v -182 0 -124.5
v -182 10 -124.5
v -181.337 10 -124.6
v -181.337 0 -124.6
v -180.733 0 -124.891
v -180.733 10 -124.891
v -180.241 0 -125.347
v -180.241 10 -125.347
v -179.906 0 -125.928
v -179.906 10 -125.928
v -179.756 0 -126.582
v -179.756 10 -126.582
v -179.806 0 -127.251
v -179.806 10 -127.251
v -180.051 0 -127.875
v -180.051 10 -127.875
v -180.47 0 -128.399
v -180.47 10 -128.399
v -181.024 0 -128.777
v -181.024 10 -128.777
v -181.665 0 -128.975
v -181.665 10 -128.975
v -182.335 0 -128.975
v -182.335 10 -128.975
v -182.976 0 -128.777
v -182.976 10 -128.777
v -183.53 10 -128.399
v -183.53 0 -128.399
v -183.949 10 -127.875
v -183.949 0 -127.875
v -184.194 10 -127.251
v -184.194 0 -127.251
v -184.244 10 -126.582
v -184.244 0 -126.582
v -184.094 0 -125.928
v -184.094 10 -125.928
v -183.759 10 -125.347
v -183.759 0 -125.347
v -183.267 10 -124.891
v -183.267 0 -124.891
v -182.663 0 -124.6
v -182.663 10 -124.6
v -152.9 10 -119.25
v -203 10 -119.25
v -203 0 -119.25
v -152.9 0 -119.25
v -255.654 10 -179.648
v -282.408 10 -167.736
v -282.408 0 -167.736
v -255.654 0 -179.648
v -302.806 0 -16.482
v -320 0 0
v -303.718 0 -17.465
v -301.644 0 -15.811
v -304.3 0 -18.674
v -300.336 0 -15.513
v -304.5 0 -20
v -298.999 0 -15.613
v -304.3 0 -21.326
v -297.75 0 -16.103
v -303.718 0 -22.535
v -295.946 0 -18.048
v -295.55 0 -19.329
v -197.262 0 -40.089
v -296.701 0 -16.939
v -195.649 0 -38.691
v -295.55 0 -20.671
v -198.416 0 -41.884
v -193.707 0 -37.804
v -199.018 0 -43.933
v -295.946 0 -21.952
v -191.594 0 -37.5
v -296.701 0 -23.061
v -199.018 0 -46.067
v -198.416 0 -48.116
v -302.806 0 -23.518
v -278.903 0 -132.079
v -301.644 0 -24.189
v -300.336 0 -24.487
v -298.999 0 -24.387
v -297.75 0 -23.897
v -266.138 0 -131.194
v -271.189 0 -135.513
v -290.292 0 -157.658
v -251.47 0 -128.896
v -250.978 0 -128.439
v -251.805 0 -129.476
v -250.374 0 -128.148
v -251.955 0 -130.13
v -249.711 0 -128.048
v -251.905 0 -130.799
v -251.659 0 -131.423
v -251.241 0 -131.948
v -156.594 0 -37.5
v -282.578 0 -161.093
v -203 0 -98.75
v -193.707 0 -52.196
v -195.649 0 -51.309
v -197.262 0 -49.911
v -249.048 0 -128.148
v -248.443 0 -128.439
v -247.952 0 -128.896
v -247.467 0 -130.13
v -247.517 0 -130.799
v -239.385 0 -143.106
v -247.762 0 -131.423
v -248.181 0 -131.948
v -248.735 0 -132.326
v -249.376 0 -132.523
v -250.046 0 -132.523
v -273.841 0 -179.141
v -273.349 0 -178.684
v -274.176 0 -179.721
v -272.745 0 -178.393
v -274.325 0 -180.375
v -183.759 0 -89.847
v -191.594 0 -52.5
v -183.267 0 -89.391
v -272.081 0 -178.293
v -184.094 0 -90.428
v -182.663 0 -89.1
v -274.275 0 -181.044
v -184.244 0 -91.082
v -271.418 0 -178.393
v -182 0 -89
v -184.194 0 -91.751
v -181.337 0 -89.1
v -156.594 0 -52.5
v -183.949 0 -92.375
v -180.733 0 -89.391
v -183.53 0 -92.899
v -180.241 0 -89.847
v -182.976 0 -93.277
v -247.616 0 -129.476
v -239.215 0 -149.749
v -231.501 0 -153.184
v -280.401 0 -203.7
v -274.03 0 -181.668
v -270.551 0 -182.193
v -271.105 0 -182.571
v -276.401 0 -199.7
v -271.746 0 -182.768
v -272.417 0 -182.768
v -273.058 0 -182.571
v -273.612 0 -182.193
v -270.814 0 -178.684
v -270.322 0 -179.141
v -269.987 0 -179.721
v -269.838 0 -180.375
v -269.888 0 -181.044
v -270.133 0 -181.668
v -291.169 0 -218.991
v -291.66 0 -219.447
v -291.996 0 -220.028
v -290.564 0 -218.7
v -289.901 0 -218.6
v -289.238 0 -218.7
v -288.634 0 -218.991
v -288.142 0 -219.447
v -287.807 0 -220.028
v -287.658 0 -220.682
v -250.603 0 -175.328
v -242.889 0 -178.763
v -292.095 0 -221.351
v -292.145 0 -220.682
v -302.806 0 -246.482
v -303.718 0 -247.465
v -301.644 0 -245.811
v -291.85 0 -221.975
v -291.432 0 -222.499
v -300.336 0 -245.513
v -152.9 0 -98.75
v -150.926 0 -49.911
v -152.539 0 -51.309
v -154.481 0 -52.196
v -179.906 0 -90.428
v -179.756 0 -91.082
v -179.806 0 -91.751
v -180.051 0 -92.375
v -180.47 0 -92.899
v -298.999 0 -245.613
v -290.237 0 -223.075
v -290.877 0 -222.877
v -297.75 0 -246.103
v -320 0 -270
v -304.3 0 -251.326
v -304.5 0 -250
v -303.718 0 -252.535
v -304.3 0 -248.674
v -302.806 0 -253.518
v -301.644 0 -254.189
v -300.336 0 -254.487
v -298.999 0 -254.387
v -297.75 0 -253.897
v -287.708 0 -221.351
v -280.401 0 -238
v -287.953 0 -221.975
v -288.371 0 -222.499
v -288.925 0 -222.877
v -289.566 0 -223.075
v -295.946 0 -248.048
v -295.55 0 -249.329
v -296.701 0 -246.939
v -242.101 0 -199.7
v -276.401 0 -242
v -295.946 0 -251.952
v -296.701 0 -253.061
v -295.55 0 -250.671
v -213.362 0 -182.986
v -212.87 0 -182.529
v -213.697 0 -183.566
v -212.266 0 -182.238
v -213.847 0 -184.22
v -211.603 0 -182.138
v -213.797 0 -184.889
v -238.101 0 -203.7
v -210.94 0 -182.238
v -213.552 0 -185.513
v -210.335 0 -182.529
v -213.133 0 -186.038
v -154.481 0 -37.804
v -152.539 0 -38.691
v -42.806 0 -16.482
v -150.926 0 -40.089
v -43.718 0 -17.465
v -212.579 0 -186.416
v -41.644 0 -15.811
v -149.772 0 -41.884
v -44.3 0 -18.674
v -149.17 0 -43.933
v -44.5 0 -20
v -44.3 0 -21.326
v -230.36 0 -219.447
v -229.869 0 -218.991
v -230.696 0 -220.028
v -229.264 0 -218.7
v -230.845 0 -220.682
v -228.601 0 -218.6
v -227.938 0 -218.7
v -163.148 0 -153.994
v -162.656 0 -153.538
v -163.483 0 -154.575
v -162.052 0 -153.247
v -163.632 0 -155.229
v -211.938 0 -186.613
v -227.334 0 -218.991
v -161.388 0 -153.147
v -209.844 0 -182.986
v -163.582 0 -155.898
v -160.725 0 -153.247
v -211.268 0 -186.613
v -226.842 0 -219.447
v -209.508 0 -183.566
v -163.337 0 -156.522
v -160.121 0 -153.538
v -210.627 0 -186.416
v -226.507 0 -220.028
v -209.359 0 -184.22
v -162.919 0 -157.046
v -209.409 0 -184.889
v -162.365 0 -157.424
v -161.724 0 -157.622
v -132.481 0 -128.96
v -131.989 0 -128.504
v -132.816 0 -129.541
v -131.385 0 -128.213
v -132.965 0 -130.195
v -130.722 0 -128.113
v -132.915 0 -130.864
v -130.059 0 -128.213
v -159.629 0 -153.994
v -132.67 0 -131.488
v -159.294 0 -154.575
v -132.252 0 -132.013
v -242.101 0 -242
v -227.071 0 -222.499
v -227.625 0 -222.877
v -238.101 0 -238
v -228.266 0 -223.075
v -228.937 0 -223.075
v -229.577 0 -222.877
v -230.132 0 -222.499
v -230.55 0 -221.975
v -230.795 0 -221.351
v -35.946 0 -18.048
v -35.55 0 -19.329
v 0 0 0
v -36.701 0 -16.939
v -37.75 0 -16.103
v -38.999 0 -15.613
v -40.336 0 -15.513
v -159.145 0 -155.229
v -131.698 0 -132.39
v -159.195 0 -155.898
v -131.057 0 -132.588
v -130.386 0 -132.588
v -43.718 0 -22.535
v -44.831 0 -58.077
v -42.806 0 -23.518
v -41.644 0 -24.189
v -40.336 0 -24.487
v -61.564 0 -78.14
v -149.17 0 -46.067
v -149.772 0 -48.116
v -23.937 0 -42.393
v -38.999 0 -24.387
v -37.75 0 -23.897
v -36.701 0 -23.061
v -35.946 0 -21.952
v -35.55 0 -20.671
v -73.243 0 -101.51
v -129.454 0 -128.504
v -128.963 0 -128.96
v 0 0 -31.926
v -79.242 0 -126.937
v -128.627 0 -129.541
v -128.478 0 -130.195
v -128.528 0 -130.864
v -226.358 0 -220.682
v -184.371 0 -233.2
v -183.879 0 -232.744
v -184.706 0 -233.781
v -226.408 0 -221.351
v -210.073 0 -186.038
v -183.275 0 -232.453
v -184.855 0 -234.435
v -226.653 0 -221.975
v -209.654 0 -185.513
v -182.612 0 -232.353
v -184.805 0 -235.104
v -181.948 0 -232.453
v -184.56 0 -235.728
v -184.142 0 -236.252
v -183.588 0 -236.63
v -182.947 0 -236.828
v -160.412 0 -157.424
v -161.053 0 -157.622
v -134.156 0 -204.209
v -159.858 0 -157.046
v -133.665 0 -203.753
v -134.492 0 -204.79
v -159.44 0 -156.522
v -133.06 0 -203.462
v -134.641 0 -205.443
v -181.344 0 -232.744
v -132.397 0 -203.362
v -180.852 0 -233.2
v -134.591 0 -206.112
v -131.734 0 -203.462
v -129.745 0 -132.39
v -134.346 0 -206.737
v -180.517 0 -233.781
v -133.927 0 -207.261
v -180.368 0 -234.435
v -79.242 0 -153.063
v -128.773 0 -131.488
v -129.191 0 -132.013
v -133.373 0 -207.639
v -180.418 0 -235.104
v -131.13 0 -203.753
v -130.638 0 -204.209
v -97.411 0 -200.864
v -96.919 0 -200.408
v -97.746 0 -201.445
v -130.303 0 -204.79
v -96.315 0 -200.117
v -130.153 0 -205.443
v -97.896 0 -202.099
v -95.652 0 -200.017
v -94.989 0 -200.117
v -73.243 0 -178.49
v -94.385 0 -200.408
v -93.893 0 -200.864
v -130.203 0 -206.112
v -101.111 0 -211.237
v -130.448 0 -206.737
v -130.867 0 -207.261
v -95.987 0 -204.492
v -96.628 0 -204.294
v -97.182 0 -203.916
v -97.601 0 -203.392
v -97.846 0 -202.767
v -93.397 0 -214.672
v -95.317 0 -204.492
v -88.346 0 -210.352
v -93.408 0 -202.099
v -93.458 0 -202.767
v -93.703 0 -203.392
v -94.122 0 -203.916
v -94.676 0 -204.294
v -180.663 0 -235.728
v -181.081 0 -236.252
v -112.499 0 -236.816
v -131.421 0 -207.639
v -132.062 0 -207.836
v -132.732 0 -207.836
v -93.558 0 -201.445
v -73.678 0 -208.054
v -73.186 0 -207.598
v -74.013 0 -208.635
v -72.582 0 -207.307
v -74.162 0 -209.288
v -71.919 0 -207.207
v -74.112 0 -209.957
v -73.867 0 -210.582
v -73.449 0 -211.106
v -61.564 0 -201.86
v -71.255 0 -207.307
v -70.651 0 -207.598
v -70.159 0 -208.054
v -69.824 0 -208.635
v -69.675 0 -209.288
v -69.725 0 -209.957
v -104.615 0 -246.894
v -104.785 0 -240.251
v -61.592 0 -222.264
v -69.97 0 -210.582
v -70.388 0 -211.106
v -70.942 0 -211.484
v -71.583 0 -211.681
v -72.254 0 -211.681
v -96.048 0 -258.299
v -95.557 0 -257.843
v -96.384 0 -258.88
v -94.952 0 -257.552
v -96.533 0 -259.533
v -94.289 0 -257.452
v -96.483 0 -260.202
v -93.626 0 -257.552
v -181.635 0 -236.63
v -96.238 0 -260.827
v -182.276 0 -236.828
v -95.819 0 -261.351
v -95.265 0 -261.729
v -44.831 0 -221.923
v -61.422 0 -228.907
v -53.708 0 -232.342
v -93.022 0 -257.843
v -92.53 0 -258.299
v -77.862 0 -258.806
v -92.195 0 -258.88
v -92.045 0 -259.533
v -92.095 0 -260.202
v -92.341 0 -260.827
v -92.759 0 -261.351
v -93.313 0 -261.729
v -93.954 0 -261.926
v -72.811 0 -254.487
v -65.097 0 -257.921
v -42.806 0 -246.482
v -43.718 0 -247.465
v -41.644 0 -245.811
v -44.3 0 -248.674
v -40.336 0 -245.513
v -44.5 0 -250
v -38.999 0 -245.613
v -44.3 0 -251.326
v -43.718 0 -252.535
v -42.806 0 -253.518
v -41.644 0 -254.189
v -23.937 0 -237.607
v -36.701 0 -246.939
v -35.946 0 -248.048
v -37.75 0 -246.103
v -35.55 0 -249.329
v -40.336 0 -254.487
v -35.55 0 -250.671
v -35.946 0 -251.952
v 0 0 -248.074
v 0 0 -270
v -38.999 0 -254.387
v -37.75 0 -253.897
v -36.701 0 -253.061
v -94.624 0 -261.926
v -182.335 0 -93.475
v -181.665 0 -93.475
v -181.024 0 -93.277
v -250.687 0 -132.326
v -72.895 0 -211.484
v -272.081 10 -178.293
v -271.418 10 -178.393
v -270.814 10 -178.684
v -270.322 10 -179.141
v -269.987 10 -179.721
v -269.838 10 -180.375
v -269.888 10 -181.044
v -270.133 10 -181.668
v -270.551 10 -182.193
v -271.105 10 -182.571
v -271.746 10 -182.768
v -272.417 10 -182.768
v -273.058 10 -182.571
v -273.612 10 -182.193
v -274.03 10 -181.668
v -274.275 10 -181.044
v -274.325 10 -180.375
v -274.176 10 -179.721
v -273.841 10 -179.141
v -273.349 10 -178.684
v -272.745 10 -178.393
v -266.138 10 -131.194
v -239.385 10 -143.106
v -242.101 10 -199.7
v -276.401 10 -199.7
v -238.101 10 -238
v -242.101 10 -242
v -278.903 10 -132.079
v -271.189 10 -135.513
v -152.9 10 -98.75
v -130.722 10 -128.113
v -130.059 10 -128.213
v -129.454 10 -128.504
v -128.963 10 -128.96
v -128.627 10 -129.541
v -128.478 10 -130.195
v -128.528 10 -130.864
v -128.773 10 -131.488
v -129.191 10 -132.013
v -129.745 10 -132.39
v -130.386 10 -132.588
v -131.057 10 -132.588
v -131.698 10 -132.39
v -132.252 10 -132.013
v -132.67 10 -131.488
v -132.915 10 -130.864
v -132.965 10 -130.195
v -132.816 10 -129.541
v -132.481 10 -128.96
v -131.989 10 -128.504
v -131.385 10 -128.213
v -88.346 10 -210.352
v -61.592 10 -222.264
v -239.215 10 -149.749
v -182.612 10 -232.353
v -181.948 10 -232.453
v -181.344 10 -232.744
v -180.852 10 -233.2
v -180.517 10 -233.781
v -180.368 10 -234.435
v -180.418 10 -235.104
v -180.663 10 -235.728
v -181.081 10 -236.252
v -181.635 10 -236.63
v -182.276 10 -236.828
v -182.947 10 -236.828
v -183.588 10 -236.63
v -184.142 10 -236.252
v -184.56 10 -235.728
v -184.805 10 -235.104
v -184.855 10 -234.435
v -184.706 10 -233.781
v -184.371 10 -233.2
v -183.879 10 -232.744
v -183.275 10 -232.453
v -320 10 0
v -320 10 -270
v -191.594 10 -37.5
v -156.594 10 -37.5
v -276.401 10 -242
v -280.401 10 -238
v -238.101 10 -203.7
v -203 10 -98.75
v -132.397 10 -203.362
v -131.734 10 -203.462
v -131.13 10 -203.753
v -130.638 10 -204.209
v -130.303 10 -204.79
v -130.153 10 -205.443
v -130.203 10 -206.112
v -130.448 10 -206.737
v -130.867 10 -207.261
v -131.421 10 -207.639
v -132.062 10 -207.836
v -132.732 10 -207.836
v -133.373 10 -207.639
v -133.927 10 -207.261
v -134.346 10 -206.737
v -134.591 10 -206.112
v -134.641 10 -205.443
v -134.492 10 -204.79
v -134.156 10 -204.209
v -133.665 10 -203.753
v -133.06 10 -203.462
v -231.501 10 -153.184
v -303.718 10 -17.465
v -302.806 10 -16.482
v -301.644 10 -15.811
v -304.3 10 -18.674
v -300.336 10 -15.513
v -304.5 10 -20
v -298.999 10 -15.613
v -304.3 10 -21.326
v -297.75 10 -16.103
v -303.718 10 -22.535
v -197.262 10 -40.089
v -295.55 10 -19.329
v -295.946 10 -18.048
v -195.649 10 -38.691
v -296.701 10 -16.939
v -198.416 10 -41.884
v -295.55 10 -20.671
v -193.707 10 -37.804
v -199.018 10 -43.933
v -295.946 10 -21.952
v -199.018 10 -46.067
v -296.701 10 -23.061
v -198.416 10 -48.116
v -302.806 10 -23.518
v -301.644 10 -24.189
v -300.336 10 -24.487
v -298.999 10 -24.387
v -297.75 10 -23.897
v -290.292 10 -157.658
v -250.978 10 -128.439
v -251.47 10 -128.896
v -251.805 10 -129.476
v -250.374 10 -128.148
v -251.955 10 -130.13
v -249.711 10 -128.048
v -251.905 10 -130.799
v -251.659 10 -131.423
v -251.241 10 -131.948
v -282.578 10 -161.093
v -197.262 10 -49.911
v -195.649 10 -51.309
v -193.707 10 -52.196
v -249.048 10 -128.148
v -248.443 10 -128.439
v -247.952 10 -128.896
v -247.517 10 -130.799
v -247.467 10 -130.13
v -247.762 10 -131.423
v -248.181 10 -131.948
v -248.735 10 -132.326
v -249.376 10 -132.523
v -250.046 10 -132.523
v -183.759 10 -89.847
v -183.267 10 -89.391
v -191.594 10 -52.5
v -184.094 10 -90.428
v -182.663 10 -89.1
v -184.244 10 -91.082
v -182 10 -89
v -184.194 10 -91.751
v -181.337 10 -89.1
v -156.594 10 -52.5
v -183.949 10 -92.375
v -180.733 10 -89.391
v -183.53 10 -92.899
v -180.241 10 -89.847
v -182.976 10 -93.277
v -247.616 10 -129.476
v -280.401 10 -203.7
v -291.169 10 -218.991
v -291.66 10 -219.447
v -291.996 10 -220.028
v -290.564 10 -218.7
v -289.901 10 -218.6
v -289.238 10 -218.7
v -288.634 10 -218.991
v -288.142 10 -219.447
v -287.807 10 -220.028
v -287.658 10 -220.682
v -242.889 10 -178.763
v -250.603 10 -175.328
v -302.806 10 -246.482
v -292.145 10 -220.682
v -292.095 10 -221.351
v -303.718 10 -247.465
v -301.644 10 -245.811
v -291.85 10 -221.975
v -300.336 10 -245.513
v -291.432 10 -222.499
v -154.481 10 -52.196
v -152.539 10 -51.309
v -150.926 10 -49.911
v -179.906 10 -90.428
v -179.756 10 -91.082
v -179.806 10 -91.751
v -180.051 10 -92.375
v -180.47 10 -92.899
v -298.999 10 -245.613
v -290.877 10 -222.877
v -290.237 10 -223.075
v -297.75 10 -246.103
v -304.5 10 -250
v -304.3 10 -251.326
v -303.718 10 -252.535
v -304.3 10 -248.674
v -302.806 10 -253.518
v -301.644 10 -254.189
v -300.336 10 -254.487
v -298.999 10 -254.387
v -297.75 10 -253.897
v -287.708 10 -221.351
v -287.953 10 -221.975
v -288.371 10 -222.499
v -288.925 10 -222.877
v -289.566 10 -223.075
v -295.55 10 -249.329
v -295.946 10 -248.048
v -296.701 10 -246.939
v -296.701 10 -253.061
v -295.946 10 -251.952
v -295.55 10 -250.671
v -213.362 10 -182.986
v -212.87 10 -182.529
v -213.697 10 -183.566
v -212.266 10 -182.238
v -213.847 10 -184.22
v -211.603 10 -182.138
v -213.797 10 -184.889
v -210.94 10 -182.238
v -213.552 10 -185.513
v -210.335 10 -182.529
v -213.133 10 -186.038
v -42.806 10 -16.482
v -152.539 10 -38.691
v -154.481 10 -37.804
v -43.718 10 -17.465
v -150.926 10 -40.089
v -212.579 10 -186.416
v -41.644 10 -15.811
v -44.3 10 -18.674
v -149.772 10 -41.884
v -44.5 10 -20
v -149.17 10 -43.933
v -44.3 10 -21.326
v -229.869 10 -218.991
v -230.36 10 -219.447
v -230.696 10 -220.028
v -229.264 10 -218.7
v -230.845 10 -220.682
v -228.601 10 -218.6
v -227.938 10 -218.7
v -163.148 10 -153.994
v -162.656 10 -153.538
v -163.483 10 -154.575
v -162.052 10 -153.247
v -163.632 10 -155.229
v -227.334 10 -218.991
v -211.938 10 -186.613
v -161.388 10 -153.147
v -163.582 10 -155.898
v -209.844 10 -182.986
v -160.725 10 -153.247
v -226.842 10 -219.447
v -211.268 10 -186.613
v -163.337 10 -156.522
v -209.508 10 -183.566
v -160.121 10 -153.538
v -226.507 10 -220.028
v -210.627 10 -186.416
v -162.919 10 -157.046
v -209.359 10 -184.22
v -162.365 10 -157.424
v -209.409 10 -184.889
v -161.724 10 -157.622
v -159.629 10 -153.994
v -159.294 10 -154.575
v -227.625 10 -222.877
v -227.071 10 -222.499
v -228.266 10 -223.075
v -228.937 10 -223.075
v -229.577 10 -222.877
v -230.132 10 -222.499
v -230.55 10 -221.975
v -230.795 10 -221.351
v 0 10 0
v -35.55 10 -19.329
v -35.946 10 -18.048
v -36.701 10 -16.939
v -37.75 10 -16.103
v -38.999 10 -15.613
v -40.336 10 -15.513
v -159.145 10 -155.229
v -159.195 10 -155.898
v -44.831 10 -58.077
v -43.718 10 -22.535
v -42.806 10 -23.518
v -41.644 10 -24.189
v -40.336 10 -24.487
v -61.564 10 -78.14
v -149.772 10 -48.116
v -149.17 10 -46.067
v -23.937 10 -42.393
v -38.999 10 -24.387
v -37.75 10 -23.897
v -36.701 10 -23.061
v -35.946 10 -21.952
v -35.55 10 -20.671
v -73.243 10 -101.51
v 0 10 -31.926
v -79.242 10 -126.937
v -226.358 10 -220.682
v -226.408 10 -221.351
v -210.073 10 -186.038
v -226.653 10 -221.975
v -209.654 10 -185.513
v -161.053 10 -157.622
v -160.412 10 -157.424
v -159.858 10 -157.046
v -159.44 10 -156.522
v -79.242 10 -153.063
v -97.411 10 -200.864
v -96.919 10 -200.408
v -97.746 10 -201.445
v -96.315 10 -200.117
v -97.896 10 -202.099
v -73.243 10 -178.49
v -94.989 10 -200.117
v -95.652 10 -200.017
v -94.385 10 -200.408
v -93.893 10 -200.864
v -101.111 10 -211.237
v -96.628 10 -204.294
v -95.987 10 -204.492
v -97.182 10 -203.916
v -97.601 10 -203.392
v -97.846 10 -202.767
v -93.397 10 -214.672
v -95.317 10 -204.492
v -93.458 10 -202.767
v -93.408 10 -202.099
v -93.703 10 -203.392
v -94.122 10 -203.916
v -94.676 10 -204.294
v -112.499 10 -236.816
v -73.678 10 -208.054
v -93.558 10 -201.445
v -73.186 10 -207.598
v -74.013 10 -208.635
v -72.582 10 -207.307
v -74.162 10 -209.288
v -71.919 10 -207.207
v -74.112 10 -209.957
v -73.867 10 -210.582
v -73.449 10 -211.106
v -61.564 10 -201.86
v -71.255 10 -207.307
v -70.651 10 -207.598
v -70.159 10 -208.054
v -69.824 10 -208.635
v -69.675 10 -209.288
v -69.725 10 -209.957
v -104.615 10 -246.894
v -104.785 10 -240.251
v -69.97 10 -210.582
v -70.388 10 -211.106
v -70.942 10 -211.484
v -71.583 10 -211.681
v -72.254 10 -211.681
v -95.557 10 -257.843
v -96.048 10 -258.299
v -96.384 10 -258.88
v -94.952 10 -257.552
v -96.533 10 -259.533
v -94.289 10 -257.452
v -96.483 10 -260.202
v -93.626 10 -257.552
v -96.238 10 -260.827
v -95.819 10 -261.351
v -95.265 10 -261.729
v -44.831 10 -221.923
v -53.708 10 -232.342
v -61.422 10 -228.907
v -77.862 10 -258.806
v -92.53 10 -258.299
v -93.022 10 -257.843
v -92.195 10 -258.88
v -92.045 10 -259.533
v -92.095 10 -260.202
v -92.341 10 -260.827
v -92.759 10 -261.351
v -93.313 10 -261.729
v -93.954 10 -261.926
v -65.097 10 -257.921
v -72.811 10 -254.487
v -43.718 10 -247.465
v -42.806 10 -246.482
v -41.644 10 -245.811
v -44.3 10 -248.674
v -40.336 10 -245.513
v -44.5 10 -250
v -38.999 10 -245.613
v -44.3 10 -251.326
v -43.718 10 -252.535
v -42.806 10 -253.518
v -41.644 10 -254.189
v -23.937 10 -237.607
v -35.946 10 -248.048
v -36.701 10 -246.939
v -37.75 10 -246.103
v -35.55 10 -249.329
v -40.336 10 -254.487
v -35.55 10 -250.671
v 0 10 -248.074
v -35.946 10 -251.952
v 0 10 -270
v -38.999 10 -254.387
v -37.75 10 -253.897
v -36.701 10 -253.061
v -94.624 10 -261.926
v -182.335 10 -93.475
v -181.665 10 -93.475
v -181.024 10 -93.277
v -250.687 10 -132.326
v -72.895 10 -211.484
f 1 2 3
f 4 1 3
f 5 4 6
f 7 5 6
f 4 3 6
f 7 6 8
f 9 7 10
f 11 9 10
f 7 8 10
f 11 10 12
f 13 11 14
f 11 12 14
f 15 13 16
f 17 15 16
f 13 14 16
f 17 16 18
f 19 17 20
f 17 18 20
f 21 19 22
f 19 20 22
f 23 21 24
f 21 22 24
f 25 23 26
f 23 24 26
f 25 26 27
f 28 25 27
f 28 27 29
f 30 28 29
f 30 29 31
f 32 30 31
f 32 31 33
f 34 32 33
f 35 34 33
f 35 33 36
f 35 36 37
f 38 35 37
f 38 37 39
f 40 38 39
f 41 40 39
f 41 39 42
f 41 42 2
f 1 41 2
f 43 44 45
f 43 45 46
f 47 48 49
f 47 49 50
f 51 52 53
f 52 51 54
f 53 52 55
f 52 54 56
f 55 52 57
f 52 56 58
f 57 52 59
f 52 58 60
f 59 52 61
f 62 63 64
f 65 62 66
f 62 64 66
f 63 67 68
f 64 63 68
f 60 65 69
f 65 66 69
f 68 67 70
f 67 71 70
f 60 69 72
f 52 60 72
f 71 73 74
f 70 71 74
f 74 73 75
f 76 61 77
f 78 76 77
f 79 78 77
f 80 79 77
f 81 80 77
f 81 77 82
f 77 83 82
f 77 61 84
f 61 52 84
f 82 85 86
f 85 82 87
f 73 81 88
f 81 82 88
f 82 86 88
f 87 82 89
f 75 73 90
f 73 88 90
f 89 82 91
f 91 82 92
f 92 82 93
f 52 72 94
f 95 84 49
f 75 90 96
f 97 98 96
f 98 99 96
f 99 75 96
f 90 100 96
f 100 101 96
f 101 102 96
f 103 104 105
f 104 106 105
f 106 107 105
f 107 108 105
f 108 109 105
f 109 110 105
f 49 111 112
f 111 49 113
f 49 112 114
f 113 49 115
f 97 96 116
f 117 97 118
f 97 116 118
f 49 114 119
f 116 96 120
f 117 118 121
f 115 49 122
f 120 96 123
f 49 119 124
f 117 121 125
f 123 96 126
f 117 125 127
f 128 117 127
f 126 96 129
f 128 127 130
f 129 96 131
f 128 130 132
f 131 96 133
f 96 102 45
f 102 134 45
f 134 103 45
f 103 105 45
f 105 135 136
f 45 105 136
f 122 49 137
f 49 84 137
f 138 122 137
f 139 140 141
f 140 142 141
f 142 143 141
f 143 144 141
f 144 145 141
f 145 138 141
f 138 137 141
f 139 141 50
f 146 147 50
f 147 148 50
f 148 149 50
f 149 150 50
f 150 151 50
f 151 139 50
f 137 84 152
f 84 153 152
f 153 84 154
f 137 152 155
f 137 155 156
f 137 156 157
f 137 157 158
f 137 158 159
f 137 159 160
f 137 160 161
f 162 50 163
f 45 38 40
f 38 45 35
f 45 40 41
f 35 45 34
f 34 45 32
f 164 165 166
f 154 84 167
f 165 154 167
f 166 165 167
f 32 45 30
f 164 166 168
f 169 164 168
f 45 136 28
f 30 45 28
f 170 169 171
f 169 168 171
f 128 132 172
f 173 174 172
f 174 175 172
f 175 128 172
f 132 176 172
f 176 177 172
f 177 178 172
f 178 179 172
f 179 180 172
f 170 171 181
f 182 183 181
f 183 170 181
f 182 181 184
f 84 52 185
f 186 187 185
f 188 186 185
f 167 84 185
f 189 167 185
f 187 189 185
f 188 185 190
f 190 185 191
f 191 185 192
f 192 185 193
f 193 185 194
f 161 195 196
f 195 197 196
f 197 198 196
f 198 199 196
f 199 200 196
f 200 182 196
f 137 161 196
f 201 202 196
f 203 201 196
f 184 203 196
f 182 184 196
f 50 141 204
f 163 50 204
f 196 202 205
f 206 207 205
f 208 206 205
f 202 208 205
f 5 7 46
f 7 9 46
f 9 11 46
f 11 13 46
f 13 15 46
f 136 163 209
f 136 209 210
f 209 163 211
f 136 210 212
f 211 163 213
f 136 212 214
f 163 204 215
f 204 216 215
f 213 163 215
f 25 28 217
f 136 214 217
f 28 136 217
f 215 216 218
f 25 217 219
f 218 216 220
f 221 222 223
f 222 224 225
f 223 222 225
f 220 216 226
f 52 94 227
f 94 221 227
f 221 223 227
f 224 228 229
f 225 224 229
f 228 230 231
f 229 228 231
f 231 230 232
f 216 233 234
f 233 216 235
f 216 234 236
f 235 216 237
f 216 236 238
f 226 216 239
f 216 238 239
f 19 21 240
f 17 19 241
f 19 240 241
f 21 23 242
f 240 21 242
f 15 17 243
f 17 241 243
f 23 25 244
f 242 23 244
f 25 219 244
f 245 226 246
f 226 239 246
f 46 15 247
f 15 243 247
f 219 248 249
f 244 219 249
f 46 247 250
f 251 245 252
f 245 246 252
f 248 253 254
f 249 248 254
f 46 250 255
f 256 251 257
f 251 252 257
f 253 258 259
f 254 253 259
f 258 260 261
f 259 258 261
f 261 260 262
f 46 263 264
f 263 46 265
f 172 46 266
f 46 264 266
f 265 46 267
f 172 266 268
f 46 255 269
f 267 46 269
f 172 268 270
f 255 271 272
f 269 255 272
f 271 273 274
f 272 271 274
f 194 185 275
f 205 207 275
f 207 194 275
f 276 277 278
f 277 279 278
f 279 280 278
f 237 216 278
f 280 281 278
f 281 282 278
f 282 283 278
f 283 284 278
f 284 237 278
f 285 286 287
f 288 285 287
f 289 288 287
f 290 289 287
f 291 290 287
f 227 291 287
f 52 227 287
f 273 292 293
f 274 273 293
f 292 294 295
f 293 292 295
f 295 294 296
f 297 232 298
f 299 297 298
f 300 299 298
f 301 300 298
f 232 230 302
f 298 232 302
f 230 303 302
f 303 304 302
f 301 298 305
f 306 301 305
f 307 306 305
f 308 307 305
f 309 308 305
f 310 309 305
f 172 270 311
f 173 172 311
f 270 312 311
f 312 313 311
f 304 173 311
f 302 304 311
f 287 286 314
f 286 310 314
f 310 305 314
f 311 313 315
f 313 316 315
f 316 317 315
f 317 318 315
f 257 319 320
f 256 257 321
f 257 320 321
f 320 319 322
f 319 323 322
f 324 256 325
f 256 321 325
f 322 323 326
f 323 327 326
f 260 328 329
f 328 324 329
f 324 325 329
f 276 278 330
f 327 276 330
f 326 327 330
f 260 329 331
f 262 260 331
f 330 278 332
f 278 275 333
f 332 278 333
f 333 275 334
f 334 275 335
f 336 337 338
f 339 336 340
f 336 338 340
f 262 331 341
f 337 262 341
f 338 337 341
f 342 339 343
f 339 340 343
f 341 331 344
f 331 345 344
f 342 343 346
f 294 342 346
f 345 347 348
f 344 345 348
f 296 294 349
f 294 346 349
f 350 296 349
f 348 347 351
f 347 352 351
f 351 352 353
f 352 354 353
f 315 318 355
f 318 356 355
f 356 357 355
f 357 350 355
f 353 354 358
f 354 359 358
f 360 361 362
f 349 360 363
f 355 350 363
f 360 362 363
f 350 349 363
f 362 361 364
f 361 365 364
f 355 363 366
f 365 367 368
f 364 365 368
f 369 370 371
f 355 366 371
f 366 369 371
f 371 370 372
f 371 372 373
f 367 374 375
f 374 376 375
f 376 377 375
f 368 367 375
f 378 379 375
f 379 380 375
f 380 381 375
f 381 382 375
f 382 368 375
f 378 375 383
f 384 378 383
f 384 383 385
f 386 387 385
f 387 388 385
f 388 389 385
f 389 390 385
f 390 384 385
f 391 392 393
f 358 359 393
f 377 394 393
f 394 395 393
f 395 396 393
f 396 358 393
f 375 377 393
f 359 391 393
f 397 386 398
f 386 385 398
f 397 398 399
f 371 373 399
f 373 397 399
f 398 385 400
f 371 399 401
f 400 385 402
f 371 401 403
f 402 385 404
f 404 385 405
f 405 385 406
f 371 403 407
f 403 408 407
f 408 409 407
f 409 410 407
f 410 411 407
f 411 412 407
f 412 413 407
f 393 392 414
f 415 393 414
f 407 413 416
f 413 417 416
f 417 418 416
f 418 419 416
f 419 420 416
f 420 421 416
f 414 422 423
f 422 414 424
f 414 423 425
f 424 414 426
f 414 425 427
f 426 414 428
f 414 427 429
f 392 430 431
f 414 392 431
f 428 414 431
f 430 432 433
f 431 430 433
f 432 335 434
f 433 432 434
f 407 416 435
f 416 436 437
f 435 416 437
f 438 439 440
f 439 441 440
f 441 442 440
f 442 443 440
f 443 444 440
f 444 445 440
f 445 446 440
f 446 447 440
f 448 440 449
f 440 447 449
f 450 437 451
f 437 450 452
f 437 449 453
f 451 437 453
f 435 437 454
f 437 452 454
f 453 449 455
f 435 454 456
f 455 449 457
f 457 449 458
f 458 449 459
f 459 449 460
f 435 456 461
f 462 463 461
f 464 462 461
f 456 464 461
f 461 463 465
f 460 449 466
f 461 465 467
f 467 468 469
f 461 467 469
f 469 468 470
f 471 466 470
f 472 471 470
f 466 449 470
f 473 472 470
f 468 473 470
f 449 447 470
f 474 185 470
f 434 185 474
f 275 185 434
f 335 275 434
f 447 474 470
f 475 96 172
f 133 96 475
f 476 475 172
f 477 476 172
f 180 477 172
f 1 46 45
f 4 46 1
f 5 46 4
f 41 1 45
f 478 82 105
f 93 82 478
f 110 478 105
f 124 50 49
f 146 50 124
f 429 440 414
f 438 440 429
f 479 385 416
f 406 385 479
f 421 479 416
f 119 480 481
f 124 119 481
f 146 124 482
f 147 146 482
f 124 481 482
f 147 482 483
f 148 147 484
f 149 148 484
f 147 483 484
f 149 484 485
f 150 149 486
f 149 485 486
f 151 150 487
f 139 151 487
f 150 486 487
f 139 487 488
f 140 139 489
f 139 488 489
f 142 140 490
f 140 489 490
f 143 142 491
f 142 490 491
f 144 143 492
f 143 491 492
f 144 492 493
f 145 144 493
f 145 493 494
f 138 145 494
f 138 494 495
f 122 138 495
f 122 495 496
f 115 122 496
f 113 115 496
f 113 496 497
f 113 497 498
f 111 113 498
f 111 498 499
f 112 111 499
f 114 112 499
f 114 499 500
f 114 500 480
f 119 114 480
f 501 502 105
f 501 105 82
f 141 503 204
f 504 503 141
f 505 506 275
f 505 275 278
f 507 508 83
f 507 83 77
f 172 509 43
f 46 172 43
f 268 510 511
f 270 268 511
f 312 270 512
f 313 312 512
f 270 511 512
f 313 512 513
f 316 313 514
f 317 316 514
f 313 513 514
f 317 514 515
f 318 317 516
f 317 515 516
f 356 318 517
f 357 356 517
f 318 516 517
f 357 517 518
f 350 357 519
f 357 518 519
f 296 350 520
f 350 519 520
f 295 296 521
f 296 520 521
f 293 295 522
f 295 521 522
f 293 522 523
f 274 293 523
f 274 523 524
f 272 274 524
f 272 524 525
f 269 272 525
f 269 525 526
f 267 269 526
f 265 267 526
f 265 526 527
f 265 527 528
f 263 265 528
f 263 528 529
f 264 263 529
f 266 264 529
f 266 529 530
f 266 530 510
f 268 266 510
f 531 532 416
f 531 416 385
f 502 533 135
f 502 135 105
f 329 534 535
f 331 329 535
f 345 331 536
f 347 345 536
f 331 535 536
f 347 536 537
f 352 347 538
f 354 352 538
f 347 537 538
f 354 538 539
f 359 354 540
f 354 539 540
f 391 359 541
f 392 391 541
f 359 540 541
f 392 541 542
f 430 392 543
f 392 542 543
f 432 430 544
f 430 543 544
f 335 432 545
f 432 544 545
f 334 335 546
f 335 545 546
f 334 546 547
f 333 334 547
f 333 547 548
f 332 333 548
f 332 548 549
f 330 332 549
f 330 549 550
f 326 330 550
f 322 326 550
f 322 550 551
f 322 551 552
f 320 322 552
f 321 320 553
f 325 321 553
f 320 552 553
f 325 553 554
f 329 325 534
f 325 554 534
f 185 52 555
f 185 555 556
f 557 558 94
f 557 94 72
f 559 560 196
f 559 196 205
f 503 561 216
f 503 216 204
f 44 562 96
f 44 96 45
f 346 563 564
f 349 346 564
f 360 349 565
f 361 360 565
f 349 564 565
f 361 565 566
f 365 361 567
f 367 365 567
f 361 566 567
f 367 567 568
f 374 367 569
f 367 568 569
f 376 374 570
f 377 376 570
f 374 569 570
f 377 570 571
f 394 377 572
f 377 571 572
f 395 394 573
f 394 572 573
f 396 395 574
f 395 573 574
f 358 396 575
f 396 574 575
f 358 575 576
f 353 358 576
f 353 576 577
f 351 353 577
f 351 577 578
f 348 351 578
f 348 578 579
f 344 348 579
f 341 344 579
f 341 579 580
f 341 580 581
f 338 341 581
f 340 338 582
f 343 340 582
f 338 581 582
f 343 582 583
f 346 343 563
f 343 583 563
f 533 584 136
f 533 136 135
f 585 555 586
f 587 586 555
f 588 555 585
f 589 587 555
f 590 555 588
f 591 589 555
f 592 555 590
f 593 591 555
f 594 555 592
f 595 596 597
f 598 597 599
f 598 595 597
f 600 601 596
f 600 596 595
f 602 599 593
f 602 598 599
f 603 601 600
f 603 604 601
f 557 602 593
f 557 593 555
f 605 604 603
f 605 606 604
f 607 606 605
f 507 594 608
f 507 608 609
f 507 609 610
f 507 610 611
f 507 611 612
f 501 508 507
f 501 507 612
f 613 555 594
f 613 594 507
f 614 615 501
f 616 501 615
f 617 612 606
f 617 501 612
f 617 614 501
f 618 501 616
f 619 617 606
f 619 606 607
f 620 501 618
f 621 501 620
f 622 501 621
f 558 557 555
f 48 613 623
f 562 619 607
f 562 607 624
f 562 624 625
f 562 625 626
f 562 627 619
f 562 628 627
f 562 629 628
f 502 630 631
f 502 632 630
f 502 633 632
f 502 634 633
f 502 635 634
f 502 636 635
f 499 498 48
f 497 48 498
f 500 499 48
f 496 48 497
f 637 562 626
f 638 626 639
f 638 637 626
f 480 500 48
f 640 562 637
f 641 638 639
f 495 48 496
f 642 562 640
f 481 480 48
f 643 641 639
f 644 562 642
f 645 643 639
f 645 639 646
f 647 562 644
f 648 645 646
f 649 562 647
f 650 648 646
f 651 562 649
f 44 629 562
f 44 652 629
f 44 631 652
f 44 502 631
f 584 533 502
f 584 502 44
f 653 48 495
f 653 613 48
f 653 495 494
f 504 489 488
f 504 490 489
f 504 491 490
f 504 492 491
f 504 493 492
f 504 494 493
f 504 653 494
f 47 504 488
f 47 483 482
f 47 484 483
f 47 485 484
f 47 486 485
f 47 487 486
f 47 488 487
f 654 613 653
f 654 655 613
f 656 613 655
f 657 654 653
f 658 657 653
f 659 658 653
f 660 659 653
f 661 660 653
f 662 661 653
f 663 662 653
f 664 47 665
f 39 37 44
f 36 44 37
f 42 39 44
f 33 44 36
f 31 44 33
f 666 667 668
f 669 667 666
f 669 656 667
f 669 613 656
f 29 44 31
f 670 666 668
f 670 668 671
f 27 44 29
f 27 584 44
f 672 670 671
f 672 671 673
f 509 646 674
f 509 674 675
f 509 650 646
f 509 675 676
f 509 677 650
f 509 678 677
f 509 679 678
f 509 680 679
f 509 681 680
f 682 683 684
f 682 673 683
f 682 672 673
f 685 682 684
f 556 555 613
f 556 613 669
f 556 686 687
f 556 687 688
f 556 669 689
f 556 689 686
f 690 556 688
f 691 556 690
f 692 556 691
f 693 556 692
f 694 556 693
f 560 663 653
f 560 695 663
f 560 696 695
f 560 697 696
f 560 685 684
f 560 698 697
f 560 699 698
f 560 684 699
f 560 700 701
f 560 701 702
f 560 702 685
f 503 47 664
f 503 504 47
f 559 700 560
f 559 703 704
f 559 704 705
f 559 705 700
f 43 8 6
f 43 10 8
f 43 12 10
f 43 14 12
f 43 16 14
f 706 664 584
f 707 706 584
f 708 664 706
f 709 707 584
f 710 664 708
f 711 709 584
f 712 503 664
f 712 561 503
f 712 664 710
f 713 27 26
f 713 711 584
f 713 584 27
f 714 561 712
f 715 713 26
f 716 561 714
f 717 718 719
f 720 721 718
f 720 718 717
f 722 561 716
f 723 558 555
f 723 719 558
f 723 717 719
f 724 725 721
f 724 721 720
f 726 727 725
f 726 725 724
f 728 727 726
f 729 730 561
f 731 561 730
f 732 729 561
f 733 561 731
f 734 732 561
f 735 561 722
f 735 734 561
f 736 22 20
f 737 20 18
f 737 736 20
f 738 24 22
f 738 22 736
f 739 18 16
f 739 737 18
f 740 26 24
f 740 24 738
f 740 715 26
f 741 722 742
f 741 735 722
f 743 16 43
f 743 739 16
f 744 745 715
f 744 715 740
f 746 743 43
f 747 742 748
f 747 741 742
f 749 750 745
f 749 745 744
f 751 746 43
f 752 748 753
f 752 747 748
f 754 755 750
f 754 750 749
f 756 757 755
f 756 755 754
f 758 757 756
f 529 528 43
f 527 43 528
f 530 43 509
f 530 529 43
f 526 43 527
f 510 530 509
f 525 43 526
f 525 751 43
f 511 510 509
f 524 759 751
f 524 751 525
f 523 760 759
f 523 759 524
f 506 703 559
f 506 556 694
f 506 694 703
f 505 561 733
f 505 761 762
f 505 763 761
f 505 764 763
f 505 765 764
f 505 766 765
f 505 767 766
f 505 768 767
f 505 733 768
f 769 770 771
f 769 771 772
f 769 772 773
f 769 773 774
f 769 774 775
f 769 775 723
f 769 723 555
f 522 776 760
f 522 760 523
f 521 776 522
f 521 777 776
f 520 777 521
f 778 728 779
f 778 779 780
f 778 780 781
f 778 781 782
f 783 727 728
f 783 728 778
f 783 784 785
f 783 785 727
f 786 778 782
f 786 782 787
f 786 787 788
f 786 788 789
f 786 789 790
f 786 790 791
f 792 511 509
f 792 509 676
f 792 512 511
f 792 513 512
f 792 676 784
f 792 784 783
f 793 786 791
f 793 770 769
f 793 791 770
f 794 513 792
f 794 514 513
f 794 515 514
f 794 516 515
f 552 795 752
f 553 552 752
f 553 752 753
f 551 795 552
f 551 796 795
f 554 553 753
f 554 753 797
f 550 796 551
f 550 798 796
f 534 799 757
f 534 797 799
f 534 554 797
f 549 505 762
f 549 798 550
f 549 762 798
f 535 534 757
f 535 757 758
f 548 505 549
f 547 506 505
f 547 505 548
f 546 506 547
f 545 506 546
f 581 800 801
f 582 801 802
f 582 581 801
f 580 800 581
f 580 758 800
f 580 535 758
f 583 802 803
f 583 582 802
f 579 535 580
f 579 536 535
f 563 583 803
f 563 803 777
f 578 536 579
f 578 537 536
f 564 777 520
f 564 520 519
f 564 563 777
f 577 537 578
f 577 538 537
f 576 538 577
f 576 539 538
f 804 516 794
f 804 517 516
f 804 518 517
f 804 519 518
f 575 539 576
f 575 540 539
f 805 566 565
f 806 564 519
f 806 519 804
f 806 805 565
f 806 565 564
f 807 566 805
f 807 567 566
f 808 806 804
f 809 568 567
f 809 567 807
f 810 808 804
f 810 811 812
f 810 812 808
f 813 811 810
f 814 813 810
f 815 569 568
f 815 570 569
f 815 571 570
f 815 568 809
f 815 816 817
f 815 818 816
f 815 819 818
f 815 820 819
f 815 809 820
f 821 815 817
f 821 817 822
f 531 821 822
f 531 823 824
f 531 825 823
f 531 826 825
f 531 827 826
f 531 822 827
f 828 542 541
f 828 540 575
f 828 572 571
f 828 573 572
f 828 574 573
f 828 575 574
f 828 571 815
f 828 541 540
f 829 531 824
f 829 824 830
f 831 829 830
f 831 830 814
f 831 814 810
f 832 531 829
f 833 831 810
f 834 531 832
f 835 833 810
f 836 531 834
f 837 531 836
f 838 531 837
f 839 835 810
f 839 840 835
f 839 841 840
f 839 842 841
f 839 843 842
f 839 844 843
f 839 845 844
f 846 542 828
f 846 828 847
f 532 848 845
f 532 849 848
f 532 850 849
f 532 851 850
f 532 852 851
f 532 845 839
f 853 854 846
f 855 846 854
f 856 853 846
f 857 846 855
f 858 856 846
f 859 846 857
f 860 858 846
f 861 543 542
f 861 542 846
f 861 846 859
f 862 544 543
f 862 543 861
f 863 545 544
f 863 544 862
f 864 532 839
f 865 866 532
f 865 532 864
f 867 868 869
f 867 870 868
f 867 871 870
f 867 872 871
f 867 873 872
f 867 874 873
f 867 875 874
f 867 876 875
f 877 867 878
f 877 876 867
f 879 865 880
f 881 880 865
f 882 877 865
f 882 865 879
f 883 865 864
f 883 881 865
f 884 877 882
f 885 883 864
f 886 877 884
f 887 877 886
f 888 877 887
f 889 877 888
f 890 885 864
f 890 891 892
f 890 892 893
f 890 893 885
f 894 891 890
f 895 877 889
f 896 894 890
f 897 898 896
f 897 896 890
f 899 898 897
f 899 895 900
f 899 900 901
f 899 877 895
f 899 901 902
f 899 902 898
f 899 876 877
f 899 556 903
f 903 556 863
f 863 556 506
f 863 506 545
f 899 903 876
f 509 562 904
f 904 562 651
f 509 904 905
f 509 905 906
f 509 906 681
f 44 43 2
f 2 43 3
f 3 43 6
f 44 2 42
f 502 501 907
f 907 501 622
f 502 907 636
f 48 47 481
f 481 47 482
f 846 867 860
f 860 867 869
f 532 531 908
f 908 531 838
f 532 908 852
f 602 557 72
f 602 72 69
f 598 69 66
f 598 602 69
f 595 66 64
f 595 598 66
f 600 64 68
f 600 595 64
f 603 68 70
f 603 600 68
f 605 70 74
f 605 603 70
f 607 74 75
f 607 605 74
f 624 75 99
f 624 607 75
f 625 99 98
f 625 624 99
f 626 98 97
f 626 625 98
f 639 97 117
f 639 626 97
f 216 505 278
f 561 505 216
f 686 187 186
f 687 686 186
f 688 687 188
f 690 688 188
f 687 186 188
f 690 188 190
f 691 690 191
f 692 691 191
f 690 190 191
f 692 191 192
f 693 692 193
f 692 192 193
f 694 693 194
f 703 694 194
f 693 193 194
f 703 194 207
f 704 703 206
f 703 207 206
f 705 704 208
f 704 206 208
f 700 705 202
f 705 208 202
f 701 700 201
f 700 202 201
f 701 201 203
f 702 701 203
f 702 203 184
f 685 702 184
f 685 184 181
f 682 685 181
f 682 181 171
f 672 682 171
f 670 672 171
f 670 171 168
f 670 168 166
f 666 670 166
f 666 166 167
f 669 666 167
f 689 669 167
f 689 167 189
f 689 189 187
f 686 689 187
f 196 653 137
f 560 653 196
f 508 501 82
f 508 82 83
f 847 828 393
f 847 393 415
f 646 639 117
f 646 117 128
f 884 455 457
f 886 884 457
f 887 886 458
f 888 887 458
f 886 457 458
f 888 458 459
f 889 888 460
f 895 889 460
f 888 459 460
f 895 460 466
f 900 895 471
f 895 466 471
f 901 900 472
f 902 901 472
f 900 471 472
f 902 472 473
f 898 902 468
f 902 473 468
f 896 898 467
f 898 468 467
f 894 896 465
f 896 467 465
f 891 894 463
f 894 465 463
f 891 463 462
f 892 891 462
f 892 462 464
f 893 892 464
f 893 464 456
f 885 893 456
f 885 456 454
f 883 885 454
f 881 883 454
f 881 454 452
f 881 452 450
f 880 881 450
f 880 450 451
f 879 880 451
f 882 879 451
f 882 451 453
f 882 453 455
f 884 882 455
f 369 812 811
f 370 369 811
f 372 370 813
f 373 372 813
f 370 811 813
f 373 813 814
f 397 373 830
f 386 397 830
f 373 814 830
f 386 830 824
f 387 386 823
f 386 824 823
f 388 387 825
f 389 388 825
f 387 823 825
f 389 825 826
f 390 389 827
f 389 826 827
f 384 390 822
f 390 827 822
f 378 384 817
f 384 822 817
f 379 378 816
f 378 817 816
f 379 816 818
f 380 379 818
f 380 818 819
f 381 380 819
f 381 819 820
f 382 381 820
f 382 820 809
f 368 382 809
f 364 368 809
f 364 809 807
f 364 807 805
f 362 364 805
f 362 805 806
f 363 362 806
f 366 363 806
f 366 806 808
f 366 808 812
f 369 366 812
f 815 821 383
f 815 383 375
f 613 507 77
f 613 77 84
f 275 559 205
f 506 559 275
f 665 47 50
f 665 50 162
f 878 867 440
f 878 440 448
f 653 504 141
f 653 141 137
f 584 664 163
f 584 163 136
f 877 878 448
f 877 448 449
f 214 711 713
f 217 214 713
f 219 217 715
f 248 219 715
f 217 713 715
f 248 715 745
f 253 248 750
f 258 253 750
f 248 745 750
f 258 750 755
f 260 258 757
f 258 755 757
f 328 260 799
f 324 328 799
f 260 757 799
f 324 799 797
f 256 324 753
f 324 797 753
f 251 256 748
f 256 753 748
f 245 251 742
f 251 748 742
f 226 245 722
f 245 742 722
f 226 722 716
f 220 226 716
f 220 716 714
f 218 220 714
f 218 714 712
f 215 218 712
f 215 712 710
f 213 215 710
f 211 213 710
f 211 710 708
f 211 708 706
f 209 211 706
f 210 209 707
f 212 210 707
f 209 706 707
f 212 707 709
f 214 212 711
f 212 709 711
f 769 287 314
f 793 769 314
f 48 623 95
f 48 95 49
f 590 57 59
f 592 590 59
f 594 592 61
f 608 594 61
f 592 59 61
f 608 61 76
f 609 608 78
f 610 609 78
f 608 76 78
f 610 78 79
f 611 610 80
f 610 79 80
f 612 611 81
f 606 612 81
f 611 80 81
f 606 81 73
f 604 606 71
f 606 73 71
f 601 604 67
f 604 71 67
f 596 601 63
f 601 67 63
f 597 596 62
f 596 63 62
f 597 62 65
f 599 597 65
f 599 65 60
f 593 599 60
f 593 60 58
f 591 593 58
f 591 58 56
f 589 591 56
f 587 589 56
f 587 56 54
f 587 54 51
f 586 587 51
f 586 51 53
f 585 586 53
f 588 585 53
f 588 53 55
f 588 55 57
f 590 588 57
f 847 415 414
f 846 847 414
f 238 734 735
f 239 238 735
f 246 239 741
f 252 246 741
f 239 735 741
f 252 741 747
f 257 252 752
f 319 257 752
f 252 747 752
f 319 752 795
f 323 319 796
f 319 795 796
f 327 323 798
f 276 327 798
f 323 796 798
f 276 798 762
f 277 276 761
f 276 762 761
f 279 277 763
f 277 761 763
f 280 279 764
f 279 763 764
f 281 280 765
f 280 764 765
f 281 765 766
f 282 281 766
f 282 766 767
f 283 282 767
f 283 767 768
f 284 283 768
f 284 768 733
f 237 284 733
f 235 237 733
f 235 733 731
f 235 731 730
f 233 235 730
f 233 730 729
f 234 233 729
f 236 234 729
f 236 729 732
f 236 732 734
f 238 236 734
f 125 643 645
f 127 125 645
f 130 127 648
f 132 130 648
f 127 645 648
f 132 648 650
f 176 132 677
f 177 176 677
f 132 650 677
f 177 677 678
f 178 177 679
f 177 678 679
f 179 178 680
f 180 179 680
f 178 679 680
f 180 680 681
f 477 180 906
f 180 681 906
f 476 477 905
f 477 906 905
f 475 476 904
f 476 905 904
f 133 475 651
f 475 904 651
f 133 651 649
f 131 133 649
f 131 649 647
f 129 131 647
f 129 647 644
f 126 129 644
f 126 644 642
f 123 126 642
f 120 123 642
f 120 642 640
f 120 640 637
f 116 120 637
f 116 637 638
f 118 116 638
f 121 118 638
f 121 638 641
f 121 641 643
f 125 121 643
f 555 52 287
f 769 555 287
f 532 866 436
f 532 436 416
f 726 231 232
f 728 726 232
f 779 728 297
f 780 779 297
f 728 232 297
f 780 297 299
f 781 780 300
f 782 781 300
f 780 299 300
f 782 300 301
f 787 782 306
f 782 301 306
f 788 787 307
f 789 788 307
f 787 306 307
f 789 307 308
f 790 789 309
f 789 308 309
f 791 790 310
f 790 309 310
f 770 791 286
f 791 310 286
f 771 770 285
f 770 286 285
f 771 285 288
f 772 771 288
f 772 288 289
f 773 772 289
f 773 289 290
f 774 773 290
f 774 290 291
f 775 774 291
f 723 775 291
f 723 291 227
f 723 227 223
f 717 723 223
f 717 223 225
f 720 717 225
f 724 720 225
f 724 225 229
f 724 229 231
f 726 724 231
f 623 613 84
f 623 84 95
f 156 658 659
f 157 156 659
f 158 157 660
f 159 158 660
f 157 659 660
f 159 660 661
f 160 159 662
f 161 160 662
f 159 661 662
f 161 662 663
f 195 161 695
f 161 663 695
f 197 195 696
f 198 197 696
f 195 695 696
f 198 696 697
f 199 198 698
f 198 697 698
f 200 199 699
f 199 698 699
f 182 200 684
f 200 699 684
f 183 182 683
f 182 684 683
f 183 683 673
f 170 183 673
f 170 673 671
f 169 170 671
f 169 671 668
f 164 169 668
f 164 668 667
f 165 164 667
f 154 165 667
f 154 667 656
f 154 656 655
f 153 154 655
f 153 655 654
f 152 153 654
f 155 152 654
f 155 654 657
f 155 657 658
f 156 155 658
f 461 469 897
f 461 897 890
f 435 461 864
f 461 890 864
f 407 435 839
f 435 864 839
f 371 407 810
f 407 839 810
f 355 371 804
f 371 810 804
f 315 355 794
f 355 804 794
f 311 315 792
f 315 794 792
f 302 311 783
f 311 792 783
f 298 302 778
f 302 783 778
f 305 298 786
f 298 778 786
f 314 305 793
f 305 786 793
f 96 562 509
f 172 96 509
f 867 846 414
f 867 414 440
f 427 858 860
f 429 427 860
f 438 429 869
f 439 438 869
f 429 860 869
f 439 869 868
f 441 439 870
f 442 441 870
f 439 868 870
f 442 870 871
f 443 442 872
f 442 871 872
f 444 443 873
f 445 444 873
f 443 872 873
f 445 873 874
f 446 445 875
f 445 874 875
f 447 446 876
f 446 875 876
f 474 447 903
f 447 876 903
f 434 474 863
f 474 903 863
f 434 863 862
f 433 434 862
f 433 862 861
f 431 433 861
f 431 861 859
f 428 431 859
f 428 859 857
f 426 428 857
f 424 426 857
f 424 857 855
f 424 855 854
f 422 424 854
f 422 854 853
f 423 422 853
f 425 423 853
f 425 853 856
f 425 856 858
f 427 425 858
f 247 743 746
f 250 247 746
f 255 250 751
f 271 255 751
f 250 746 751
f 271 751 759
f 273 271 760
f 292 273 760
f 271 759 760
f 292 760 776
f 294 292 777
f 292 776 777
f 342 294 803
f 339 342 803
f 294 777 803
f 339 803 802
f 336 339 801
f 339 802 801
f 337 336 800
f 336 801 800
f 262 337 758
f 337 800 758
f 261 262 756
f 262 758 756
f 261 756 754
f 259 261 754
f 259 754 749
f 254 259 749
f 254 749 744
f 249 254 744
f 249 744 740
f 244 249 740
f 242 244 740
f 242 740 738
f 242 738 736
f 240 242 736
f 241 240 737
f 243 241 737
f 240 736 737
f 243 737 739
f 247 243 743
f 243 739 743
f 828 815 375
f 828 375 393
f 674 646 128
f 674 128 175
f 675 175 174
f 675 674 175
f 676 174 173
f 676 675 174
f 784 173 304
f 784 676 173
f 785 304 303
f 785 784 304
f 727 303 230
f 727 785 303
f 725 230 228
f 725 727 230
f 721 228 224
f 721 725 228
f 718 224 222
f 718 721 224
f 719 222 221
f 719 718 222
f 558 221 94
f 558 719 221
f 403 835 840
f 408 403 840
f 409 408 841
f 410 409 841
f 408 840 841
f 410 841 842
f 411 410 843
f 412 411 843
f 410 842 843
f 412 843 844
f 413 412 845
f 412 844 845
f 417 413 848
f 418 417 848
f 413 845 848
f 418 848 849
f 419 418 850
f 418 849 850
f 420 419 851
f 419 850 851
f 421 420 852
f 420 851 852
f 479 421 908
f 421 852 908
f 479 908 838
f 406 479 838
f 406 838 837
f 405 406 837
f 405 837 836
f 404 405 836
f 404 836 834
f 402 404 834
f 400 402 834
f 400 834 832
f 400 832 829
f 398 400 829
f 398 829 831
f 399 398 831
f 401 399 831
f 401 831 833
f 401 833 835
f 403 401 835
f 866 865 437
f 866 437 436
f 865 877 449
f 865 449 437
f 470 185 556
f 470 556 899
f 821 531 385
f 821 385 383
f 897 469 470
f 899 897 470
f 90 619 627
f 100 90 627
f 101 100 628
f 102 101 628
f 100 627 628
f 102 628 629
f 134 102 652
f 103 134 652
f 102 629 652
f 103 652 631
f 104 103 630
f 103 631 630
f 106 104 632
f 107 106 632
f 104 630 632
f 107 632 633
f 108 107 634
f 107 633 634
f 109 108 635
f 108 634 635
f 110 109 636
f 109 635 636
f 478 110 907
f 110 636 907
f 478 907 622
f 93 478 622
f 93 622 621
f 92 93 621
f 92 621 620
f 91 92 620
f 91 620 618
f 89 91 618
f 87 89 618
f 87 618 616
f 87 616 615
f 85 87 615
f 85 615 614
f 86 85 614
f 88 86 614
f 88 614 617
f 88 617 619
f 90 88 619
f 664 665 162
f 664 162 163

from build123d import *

# Parameters (mm, degrees)
SCHIZZO1_W                   = 320
SCHIZZO1_H                   = 270
ESTRUSIONE_ESTRUSIONE1_DEPTH = 10
SCHIZZO3_R                   = 2.25
TAGLIO_ESTRUSIONE2_DEPTH     = 10
SCHIZZO4_R                   = 2.25
TAGLIO_ESTRUSIONE3_DEPTH     = 33
FORO_PER_VITE_M8_1_D         = 9
FORO_PER_VITE_M8_1_DEPTH     = 188
FORO_PER_VITE_M8_1_TIP       = 2.703872786
SCHIZZO7_R                   = 113
TAGLIO_ESTRUSIONE4_DEPTH     = 10
TAGLIO_ESTRUSIONE5_DEPTH     = 22
SCHIZZO9_R                   = 2.25
TAGLIO_ESTRUSIONE6_DEPTH     = 42.3
SCHIZZO10_W                  = 50.1
SCHIZZO10_H                  = 20.5
TAGLIO_ESTRUSIONE7_DEPTH     = 42.3
SCHIZZO11_R                  = 2.25
TAGLIO_ESTRUSIONE8_DEPTH     = 18
SCHIZZO12_R                  = 2.25
TAGLIO_ESTRUSIONE9_DEPTH     = 179
TAGLIO_ESTRUSIONE10_DEPTH    = 179


with BuildPart() as part:
    # Schizzo1 → Estrusione-Estrusione1 (new body)
    with BuildSketch(Plane(origin=(0, 0, 0), x_dir=(1, 0, 0), z_dir=(0, 1, 0))):
        with Locations((-160, 135)):
            Rectangle(SCHIZZO1_W, SCHIZZO1_H)
    extrude(amount=ESTRUSIONE_ESTRUSIONE1_DEPTH)

    # Schizzo3 → Taglio-Estrusione2 (cut)
    with BuildSketch(Plane(origin=(0, 10, 0), x_dir=(1, 0, 0), z_dir=(0, 1, 0))):
        with Locations(Location((-132.397041122, 205.611580849, 0), (0, 0, 270))):
            Circle(SCHIZZO3_R)
        with Locations(Location((-161.388419151, 155.397041122, 0), (0, 0, 270))):
            Circle(SCHIZZO3_R)
        with Locations(Location((-182.611580849, 234.602958878, 0), (0, 0, 270))):
            Circle(SCHIZZO3_R)
        with Locations(Location((-211.602958878, 184.388419151, 0), (0, 0, 270))):
            Circle(SCHIZZO3_R)
    extrude(amount=-TAGLIO_ESTRUSIONE2_DEPTH, mode=Mode.SUBTRACT)

    # Schizzo4 → Taglio-Estrusione3 (cut)
    with BuildSketch(Plane(origin=(0, 10, 0), x_dir=(1, 0, 0), z_dir=(0, 1, 0))):
        with Locations(Location((-272.0814314, 180.543373533, 0), (0, 0, 270))):
            Circle(SCHIZZO4_R)
        with Locations(Location((-249.710916031, 130.298373362, 0), (0, 0, 270))):
            Circle(SCHIZZO4_R)
        with Locations(Location((-94.289083758, 259.701626731, 0), (0, 0, 270))):
            Circle(SCHIZZO4_R)
        with Locations(Location((-71.918568389, 209.456626561, 0), (0, 0, 270))):
            Circle(SCHIZZO4_R)
        Polygon((-112.499215416, 236.816363994), (-104.785184586, 240.250871799), (-104.615474565, 246.89424924), (-77.861643306, 258.805822358), (-72.811093568, 254.486654307), (-65.097062738, 257.921162112), (-53.708436732, 232.341889298), (-61.422467562, 228.907381493), (-61.592177583, 222.264004053), (-88.346008842, 210.352430934), (-93.396558579, 214.671598985), (-101.110589409, 211.23709118), align=None)
        Polygon((-242.88941038, 178.762908913), (-231.500784374, 153.183636099), (-239.214815204, 149.749128294), (-239.384525224, 143.105750854), (-266.138356484, 131.194177735), (-271.188906221, 135.513345787), (-278.902937051, 132.078837982), (-290.291563058, 157.658110796), (-282.577532228, 161.092618601), (-282.407822207, 167.735996041), (-255.653990947, 179.64756916), (-250.60344121, 175.328401108), align=None)
    extrude(amount=-TAGLIO_ESTRUSIONE3_DEPTH, mode=Mode.SUBTRACT)

    # Foro per Vite M8-1
    with Locations(Plane(origin=(0, 10, 0), x_dir=(1, 0, 0), z_dir=(0, 1, 0))):
        with Locations((-300, 20), (-300, 250), (-40, 250), (-40, 20)):
            Hole(FORO_PER_VITE_M8_1_D / 2, depth=FORO_PER_VITE_M8_1_DEPTH)
            with Locations((0, 0, -(FORO_PER_VITE_M8_1_DEPTH + FORO_PER_VITE_M8_1_TIP / 2))):  # 118° drill point
                Cone(0, FORO_PER_VITE_M8_1_D / 2, FORO_PER_VITE_M8_1_TIP, mode=Mode.SUBTRACT)

    # Schizzo7 → Taglio-Estrusione4 (cut)
    with BuildSketch(Plane(origin=(0, 10, 0), x_dir=(1, 0, 0), z_dir=(0, 1, 0))):
        with Locations((33, 140)):
            Circle(SCHIZZO7_R)
    extrude(amount=-TAGLIO_ESTRUSIONE4_DEPTH, mode=Mode.SUBTRACT)

    # Schizzo8 → Taglio-Estrusione5 (cut)
    with BuildSketch(Plane(origin=(0, 10, 0), x_dir=(1, 0, 0), z_dir=(0, 1, 0))):
        Polygon((-280.401232083, 238), (-276.401232083, 242), (-242.101232083, 242), (-238.101232083, 238), (-238.101232083, 203.7), (-242.101232083, 199.7), (-276.401232083, 199.7), (-280.401232083, 203.7), align=None)
    extrude(amount=-TAGLIO_ESTRUSIONE5_DEPTH, mode=Mode.SUBTRACT)

    # Schizzo9 → Taglio-Estrusione6 (cut)
    with BuildSketch(Plane(origin=(0, 10, 0), x_dir=(1, 0, 0), z_dir=(0, 1, 0))):
        with Locations(Location((-228.601232, 220.85, 0), (0, 0, 270))):
            Circle(SCHIZZO9_R)
        with Locations(Location((-289.901232, 220.85, 0), (0, 0, 270))):
            Circle(SCHIZZO9_R)
    extrude(amount=-TAGLIO_ESTRUSIONE6_DEPTH, mode=Mode.SUBTRACT)

    # Schizzo10 → Taglio-Estrusione7 (cut)
    with BuildSketch(Plane(origin=(0, 10, 0), x_dir=(1, 0, 0), z_dir=(0, 1, 0))):
        with Locations((-177.95, 109)):
            Rectangle(SCHIZZO10_W, SCHIZZO10_H)
    extrude(amount=-TAGLIO_ESTRUSIONE7_DEPTH, mode=Mode.SUBTRACT)

    # Schizzo11 → Taglio-Estrusione8 (cut)
    with BuildSketch(Plane(origin=(0, 10, 0), x_dir=(1, 0, 0), z_dir=(0, 1, 0))):
        with Locations(Location((-182, 91.25, 0), (0, 0, 270))):
            Circle(SCHIZZO11_R)
        with Locations(Location((-182, 126.75, 0), (0, 0, 270))):
            Circle(SCHIZZO11_R)
    extrude(amount=-TAGLIO_ESTRUSIONE8_DEPTH, mode=Mode.SUBTRACT)

    # Schizzo12 → Taglio-Estrusione9 (cut)
    with BuildSketch(Plane(origin=(0, 10, 0), x_dir=(1, 0, 0), z_dir=(0, 1, 0))):
        with Locations(Location((-95.652024181, 202.266681741, 0), (0, 0, 270))):
            Circle(SCHIZZO12_R)
        with Locations(Location((-130.721715924, 130.363158037, 0), (0, 0, 270))):
            Circle(SCHIZZO12_R)
    extrude(amount=-TAGLIO_ESTRUSIONE9_DEPTH, mode=Mode.SUBTRACT)

    # Schizzo13 → Taglio-Estrusione10 (cut)
    with BuildSketch(Plane(origin=(0, 10, 0), x_dir=(1, 0, 0), z_dir=(0, 1, 0))):
        with BuildLine():
            Line((-191.594117082, 52.5), (-156.594117082, 52.5))
            ThreePointArc((-156.594117082, 52.5), (-149.094117082, 45), (-156.594117082, 37.5))
            Line((-156.594117082, 37.5), (-191.594117082, 37.5))
            ThreePointArc((-191.594117082, 37.5), (-199.094117082, 45), (-191.594117082, 52.5))
        make_face()
    extrude(amount=-TAGLIO_ESTRUSIONE10_DEPTH, mode=Mode.SUBTRACT)


solid = part.part
